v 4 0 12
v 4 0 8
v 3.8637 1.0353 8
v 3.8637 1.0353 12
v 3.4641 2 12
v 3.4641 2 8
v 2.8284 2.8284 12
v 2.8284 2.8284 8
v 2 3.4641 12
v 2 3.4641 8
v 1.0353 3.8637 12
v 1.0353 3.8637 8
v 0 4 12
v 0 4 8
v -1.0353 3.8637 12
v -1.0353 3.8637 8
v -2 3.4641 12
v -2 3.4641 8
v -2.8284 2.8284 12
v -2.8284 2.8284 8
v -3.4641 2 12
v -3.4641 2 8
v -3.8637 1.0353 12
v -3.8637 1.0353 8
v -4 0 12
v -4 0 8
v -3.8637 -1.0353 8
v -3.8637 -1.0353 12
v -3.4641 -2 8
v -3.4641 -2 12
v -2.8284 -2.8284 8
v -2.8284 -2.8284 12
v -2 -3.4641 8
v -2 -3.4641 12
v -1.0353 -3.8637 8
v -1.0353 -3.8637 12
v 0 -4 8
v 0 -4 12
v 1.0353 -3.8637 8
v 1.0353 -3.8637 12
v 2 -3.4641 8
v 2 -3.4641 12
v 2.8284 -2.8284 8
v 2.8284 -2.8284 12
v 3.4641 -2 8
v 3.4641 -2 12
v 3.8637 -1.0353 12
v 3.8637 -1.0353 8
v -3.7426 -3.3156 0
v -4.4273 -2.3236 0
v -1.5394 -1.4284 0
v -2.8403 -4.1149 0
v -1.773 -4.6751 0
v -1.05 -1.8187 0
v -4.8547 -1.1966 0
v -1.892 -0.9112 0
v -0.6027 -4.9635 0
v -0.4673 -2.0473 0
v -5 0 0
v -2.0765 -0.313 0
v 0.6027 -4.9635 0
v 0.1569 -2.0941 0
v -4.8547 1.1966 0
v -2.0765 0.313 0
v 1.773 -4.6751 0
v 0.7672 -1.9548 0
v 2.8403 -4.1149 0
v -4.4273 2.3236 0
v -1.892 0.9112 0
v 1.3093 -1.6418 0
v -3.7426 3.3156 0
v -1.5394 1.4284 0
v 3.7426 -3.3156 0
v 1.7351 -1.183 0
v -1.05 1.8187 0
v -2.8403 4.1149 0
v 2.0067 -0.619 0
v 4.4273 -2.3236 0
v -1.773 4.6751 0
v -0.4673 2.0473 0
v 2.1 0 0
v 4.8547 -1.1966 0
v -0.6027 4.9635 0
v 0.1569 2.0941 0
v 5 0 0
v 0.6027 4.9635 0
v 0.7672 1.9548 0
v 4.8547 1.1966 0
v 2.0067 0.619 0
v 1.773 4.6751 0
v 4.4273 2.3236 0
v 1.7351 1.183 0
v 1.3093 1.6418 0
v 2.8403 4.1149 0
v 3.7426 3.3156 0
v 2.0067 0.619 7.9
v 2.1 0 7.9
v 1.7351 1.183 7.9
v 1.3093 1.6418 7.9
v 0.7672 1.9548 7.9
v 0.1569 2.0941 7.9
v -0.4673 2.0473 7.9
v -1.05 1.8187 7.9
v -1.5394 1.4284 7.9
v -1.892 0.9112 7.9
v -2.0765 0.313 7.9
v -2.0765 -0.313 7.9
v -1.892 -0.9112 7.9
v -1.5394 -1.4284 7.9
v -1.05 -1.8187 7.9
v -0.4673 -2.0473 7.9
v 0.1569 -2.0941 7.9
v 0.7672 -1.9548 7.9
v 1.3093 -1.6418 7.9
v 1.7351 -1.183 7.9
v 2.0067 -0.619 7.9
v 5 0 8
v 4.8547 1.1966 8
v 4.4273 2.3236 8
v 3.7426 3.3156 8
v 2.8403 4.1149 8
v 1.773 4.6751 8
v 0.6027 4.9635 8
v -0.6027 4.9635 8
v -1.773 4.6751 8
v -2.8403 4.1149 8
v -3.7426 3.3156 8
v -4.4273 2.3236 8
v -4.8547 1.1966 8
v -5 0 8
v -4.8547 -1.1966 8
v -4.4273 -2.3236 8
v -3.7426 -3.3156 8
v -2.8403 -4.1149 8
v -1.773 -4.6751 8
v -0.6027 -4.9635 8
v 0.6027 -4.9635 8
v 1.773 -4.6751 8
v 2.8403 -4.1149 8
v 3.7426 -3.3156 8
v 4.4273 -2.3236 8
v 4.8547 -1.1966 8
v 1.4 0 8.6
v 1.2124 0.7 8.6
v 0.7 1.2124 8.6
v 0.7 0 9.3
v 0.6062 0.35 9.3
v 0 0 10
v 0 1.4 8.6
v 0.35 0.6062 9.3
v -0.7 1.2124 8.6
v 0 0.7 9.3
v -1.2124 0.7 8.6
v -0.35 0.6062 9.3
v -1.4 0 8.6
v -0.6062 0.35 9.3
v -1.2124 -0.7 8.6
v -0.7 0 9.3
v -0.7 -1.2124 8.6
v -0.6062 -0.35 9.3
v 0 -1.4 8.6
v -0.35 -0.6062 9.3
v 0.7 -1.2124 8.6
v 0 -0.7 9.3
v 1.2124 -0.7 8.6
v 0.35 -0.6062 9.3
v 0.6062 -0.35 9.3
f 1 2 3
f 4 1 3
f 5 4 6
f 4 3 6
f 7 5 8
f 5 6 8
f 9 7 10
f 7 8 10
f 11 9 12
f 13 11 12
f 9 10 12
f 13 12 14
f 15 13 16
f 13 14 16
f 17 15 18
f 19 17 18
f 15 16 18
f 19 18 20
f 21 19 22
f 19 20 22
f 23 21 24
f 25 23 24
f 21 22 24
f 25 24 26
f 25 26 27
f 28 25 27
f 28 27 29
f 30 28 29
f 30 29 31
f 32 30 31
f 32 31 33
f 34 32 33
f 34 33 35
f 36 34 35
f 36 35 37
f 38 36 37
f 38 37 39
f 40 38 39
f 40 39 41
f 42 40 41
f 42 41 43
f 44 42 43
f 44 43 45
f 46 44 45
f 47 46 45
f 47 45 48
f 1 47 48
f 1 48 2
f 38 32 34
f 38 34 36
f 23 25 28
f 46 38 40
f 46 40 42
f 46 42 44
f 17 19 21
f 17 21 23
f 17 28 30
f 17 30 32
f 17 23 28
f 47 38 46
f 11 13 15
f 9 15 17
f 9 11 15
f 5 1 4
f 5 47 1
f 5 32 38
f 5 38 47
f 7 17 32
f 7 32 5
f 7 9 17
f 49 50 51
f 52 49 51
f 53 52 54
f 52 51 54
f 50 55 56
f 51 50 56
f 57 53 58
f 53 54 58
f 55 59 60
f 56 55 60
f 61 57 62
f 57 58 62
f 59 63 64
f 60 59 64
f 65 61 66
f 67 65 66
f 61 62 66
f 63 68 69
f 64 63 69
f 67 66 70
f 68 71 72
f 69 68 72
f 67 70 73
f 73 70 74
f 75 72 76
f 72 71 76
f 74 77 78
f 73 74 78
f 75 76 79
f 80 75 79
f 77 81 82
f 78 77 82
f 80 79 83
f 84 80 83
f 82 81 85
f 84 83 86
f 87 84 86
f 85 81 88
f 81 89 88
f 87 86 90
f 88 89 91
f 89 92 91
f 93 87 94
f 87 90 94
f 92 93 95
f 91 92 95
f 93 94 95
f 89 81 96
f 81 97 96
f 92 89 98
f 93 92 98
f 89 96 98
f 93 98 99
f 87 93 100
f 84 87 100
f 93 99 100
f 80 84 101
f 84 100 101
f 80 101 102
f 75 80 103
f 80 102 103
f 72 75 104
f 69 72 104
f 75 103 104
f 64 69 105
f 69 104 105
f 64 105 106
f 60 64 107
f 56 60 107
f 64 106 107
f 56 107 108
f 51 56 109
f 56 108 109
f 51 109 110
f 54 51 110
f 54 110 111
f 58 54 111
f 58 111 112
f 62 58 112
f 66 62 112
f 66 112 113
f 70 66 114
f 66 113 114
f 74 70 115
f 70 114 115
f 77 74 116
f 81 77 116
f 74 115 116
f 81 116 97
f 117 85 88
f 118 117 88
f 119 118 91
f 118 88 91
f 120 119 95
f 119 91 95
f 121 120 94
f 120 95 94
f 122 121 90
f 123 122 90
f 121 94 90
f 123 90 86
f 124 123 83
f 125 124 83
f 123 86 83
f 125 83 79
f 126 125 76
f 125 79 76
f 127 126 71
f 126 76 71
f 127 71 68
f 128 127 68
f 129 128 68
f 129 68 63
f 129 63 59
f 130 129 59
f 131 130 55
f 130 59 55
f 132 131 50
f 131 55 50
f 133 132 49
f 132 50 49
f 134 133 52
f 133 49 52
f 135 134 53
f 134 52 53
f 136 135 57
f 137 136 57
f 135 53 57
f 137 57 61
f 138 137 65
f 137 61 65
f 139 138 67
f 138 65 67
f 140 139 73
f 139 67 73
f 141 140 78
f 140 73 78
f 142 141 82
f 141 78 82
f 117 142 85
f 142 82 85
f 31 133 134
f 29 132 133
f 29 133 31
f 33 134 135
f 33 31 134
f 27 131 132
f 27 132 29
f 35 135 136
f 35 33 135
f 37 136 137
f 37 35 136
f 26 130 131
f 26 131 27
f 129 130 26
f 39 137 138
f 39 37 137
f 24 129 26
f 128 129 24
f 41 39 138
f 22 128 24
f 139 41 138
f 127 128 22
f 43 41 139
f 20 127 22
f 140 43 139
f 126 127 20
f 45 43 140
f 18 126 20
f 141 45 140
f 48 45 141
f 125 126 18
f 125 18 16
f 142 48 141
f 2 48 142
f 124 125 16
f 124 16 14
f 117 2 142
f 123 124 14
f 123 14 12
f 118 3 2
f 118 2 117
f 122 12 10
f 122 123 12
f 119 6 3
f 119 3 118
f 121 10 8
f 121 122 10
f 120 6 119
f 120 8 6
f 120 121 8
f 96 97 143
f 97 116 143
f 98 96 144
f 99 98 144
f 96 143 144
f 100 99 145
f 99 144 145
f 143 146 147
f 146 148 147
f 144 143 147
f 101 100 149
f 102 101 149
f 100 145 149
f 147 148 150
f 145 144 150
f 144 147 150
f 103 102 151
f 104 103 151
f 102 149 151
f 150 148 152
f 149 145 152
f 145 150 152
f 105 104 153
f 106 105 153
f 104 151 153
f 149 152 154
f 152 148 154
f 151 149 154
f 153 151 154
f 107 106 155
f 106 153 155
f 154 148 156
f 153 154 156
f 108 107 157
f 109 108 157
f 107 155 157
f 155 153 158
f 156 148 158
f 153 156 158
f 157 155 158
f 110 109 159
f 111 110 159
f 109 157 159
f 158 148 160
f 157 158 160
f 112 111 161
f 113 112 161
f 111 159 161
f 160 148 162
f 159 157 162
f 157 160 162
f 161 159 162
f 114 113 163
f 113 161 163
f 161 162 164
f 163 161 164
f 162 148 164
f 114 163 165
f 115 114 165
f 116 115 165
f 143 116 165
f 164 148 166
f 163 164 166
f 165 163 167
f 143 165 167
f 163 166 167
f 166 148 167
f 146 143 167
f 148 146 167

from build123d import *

# Parameters (mm, degrees)
F0_R     = 5
F0_R_2   = 4
F1_DEPTH = 8
F2_DEPTH = 12


with BuildPart() as f1:
    # F0 (on Top) → F1 (new body)
    with BuildSketch(Plane.XY):
        Circle(F0_R)
        Circle(F0_R_2, mode=Mode.SUBTRACT)
    extrude(amount=F1_DEPTH)

    # F0 (on Top) → F2 (join)
    with BuildSketch(Plane.XY):
        Circle(F0_R_2)
    extrude(amount=F2_DEPTH)

    # F3 (on Front) → F4 (revolve, cut)
    with BuildSketch(Plane.XZ):
        Polygon((2.1, -3.645375), (2.1, 0), (2.1, 7.9), (0, 10), (0, -3.645375), align=None)
    revolve(axis=Axis((0, 0, 3.177312), (0, 0, 1)), mode=Mode.SUBTRACT)


solid = f1.part
